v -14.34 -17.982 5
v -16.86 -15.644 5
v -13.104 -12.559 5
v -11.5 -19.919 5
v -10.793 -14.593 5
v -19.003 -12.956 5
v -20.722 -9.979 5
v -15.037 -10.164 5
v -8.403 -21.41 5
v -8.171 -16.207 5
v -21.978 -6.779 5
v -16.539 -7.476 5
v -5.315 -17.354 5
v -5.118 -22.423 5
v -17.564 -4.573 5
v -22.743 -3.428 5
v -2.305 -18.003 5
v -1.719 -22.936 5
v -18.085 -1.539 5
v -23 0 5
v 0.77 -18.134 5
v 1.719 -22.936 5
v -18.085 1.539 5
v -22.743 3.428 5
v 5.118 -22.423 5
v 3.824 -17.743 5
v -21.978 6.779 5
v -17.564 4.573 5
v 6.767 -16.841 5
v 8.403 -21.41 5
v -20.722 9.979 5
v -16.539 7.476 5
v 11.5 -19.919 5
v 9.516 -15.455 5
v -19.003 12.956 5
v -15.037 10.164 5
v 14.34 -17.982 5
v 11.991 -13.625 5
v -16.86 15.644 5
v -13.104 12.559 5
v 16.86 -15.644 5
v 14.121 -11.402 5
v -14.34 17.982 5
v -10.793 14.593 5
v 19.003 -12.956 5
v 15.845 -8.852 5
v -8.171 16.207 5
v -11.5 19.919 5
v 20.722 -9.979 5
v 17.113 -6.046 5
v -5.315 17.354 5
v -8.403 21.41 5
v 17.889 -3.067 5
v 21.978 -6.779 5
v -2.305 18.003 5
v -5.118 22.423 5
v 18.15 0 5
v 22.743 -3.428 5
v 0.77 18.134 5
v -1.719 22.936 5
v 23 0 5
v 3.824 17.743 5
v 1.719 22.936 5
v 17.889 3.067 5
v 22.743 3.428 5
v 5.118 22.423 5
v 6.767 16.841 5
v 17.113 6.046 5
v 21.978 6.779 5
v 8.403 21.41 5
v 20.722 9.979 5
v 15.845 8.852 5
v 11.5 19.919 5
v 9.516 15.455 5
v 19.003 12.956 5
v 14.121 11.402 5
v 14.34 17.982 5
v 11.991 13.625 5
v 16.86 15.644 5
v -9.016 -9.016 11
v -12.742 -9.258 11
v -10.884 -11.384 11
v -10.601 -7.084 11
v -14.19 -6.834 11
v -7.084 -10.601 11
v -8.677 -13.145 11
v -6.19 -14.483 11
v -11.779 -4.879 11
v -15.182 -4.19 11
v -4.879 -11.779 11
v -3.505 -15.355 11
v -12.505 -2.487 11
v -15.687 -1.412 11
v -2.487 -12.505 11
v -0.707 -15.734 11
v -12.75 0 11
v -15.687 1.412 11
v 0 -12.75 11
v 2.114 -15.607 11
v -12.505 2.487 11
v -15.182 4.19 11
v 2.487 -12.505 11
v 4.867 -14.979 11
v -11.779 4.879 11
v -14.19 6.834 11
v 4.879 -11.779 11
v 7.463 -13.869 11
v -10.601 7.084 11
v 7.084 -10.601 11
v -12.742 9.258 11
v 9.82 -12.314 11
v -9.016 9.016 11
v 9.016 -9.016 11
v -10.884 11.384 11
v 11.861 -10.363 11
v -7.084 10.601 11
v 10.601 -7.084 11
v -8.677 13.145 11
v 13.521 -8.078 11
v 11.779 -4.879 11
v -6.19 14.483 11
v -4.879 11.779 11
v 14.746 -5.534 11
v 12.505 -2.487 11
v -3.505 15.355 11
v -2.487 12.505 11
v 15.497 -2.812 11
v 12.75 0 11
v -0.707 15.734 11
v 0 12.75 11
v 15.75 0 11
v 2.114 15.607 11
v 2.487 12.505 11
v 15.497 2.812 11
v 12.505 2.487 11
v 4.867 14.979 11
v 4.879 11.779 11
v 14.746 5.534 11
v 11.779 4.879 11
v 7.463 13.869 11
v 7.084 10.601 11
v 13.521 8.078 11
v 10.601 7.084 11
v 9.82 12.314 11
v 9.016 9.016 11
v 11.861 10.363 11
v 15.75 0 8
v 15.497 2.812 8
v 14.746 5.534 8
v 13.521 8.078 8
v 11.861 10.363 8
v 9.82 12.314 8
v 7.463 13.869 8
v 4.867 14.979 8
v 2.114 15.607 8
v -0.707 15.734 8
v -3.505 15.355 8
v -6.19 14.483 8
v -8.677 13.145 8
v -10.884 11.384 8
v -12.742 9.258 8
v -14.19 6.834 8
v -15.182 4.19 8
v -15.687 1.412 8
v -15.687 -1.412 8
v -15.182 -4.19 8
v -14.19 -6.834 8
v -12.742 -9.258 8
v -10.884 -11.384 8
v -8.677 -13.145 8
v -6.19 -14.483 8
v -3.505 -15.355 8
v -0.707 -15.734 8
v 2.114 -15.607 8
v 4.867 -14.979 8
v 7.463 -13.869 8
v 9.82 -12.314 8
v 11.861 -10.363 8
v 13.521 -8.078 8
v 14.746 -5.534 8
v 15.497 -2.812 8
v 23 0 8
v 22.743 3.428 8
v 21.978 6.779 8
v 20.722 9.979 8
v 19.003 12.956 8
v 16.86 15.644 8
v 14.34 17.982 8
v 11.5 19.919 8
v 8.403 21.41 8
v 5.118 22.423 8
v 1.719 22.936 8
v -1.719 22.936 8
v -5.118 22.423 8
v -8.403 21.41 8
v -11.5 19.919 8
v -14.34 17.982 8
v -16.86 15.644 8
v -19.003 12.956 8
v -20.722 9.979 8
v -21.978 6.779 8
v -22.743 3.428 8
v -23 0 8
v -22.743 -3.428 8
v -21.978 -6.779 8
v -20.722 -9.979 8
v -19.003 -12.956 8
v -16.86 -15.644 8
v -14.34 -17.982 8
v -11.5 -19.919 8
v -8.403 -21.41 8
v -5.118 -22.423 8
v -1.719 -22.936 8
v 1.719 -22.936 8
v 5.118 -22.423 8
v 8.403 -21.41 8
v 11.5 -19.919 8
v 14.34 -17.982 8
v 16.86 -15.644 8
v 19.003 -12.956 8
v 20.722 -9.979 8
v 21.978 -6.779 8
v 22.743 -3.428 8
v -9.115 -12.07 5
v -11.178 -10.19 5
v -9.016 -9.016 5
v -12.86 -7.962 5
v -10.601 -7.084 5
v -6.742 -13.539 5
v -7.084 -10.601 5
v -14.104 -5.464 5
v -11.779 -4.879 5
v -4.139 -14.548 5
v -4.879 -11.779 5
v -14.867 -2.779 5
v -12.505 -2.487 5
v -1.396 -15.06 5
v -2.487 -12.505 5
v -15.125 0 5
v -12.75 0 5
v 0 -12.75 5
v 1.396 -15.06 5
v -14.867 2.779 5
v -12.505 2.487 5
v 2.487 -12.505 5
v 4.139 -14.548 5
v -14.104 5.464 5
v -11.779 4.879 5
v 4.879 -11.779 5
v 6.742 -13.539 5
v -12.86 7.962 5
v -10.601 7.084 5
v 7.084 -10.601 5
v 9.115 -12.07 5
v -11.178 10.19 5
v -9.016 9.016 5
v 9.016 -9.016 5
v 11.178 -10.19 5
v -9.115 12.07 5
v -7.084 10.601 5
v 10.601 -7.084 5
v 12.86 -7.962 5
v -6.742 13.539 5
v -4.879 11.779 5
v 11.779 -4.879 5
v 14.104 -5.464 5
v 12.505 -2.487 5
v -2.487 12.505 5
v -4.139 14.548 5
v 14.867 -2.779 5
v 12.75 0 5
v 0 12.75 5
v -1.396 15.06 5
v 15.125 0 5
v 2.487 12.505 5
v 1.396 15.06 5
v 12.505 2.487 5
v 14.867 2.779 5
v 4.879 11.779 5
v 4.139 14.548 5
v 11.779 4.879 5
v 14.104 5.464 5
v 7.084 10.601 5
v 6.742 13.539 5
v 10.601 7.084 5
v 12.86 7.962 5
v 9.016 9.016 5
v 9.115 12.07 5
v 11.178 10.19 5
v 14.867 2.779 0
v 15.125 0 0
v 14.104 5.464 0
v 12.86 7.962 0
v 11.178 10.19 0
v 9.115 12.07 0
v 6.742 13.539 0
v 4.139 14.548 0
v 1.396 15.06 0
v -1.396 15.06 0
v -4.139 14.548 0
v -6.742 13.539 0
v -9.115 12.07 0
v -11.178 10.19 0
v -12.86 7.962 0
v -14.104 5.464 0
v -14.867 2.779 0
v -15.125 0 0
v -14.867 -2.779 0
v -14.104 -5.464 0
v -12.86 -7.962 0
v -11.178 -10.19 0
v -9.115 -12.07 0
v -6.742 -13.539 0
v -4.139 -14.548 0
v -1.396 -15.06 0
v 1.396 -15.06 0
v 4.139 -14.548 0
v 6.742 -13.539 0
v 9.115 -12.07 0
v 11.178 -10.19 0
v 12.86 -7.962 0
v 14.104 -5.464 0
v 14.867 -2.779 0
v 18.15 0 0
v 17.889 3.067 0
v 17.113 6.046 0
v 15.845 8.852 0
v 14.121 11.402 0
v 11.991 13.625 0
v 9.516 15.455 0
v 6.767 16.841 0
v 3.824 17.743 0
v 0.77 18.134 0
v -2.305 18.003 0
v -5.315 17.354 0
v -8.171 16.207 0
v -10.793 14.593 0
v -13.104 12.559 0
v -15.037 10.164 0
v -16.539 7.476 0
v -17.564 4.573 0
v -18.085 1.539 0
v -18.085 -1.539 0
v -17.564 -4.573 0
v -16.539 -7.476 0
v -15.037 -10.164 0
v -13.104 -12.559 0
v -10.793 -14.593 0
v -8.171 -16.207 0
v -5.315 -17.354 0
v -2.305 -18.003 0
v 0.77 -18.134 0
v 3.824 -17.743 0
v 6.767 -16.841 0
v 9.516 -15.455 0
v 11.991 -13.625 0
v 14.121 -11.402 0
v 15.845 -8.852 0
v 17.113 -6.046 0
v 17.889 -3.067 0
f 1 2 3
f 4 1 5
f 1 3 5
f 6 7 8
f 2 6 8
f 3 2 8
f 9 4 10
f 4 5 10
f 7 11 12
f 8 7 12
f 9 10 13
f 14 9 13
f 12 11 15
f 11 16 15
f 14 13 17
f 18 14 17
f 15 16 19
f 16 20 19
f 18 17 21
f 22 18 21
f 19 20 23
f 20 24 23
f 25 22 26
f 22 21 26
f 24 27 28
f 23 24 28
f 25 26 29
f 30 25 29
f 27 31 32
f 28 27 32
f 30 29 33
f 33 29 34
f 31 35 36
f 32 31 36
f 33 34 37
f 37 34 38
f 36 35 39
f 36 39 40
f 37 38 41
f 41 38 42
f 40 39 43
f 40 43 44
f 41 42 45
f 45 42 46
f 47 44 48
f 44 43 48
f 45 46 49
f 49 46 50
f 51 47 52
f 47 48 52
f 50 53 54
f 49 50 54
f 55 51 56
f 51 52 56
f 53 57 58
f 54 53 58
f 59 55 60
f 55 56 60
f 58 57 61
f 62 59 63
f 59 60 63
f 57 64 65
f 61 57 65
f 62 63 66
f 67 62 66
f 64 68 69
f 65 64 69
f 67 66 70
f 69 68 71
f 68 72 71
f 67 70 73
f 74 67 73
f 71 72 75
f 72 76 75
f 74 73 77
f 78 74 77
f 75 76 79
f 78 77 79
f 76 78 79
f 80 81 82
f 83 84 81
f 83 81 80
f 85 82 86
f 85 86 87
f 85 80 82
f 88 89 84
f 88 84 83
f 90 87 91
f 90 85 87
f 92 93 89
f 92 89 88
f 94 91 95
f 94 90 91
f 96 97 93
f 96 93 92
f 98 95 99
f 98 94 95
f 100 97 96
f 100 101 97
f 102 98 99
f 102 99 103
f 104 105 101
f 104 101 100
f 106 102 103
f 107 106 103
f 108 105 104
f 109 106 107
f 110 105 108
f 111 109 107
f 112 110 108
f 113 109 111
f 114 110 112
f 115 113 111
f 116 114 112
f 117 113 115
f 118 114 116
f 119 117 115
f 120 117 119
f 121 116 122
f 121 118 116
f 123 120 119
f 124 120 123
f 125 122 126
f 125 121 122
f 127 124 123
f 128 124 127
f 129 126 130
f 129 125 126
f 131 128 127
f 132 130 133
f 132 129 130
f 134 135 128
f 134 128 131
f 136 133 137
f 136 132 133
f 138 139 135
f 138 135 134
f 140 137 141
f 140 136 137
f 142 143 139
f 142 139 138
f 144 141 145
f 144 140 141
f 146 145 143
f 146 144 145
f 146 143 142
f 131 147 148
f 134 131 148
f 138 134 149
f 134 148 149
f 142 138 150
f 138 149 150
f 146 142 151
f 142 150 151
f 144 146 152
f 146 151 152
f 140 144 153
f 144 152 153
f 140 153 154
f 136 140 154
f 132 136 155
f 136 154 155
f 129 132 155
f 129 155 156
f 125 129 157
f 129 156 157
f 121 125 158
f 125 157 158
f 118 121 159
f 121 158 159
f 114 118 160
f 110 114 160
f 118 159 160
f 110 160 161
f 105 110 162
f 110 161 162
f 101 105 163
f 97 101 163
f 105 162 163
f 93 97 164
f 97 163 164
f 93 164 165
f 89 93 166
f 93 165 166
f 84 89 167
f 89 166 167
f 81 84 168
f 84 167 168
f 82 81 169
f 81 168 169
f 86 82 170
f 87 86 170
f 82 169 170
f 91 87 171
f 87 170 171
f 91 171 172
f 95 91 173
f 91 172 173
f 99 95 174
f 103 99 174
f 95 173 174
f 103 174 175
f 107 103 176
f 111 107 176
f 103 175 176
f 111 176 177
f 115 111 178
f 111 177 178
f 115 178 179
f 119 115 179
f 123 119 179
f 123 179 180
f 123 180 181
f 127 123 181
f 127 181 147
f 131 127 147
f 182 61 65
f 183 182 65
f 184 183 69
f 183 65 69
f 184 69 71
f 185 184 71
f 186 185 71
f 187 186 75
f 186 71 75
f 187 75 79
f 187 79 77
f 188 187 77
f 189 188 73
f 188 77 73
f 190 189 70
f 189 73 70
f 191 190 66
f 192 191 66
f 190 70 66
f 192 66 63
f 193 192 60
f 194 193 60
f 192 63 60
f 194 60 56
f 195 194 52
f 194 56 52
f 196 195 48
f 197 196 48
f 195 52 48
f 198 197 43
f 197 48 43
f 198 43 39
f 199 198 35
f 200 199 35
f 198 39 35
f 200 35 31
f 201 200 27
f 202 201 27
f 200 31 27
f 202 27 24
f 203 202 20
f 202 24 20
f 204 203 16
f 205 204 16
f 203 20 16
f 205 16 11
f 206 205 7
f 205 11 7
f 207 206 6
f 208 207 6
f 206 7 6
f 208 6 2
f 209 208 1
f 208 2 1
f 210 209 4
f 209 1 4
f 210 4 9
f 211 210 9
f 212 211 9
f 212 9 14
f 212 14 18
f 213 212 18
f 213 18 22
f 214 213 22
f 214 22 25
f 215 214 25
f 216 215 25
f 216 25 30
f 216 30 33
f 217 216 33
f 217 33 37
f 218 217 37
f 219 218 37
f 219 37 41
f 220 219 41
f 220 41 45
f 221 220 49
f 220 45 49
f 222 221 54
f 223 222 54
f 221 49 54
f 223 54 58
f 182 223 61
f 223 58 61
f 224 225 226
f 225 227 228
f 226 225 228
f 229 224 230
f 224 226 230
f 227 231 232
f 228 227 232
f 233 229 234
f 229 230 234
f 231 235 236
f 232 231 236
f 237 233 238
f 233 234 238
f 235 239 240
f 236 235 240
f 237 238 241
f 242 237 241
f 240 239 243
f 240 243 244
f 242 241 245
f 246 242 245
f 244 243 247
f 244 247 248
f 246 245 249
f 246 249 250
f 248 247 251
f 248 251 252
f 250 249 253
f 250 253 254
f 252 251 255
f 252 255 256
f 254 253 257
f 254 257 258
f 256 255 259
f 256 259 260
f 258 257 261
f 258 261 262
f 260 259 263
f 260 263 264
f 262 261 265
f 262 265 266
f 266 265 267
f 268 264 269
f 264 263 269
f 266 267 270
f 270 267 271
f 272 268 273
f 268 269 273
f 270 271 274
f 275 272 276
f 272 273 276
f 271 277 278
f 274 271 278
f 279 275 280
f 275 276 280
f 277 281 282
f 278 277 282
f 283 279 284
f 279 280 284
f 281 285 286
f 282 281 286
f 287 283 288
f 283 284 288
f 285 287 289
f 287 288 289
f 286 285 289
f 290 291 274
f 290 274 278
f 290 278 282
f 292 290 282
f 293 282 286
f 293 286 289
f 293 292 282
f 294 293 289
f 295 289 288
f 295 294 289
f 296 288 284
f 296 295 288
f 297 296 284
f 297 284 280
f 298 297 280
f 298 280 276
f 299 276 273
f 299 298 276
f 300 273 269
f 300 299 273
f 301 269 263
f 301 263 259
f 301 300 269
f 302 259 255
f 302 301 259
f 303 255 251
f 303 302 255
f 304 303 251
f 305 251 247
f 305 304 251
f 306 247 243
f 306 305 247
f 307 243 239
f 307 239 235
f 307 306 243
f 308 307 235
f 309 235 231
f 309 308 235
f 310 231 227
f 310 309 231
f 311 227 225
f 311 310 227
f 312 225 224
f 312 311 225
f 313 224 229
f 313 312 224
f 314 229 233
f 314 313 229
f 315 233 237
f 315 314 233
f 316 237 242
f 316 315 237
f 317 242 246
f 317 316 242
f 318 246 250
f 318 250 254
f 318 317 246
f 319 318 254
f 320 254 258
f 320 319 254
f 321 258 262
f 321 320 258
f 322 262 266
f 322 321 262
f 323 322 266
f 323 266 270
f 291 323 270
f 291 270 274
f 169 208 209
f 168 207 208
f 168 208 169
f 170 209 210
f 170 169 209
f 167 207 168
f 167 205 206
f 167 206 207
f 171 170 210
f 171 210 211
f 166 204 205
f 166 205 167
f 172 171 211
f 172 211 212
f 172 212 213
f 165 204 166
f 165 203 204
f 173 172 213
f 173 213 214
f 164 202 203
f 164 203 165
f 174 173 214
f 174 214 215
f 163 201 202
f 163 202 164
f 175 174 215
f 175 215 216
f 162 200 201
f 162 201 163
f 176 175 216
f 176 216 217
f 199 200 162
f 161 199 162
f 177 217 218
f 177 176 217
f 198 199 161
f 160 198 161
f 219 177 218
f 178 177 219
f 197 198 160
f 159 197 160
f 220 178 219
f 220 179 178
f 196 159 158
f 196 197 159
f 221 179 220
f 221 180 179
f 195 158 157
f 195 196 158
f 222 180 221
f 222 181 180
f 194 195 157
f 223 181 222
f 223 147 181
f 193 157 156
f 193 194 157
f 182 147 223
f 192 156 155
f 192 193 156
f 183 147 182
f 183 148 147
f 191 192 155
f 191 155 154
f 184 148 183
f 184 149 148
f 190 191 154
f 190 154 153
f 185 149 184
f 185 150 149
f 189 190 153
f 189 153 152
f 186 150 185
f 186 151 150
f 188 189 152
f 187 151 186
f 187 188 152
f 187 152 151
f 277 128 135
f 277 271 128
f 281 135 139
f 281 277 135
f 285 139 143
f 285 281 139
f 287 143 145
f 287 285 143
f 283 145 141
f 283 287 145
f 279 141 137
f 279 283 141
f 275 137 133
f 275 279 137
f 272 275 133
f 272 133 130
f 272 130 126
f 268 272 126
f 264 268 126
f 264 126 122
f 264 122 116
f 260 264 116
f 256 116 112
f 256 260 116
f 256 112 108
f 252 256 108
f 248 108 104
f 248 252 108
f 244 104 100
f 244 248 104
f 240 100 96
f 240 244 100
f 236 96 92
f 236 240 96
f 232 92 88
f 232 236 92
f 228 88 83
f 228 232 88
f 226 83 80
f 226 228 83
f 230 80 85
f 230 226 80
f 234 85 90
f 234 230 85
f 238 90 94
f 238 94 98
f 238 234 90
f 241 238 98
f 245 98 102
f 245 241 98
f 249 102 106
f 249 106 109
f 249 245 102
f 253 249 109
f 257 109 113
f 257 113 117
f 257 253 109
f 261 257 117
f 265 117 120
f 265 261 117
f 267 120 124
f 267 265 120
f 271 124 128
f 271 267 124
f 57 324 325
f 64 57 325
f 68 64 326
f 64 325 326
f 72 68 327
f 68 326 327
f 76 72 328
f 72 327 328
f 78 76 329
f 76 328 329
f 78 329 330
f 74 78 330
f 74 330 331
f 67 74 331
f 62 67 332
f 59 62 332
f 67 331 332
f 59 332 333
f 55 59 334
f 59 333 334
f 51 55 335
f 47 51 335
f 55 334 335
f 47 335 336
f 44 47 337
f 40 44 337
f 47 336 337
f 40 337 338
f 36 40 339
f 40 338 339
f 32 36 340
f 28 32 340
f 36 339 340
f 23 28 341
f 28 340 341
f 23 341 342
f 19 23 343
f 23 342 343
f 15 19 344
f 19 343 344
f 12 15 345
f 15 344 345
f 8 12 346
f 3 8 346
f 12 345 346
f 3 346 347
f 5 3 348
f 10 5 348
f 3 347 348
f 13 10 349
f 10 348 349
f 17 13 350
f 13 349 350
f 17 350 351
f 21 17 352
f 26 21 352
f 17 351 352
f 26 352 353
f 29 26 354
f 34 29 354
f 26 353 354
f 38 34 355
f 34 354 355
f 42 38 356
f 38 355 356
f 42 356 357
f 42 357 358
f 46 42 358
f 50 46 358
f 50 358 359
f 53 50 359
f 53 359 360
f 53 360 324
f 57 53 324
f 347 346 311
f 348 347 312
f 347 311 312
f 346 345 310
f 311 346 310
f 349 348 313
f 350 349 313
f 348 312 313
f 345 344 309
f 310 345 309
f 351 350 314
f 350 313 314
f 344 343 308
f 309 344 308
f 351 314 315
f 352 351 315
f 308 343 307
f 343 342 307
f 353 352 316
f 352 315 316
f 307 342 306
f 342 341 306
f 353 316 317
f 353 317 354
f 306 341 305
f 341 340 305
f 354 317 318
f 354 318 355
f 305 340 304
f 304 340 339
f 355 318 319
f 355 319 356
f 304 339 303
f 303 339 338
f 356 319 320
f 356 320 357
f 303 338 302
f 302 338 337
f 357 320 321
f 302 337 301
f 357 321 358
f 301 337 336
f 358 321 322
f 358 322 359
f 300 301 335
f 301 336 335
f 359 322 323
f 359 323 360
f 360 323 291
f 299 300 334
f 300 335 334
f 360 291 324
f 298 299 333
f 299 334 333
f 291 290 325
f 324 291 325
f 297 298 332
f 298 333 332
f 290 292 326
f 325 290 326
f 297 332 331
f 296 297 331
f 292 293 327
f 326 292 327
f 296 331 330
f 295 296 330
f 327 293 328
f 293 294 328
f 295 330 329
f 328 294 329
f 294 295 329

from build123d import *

# Parameters (mm, degrees)
F0_R     = 18.15
F0_R_2   = 15.125
F1_DEPTH = 5
F2_R     = 23
F2_R_2   = 18.15
F2_R_3   = 15.125
F2_R_4   = 12.75
F3_DEPTH = 3
F4_R     = 15.75
F4_R_2   = 12.75
F5_DEPTH = 3


with BuildPart() as f1:
    # F0 (on Top) → F1 (new body)
    with BuildSketch(Plane.XY):
        Circle(F0_R)
        Circle(F0_R_2, mode=Mode.SUBTRACT)
    extrude(amount=F1_DEPTH)

    # F2 (on face) → F3 (join)
    with BuildSketch(Plane.XY.offset(5)):
        Circle(F2_R)
        Circle(F2_R_2, mode=Mode.SUBTRACT)
        Circle(F2_R_2)
        Circle(F2_R_3, mode=Mode.SUBTRACT)
        Circle(F2_R_3)
        Circle(F2_R_4, mode=Mode.SUBTRACT)
    extrude(amount=F3_DEPTH)

    # F4 (on face) → F5 (join)
    with BuildSketch(Plane.XY.offset(8)):
        Circle(F4_R)
        Circle(F4_R_2, mode=Mode.SUBTRACT)
    extrude(amount=F5_DEPTH)


solid = f1.part
